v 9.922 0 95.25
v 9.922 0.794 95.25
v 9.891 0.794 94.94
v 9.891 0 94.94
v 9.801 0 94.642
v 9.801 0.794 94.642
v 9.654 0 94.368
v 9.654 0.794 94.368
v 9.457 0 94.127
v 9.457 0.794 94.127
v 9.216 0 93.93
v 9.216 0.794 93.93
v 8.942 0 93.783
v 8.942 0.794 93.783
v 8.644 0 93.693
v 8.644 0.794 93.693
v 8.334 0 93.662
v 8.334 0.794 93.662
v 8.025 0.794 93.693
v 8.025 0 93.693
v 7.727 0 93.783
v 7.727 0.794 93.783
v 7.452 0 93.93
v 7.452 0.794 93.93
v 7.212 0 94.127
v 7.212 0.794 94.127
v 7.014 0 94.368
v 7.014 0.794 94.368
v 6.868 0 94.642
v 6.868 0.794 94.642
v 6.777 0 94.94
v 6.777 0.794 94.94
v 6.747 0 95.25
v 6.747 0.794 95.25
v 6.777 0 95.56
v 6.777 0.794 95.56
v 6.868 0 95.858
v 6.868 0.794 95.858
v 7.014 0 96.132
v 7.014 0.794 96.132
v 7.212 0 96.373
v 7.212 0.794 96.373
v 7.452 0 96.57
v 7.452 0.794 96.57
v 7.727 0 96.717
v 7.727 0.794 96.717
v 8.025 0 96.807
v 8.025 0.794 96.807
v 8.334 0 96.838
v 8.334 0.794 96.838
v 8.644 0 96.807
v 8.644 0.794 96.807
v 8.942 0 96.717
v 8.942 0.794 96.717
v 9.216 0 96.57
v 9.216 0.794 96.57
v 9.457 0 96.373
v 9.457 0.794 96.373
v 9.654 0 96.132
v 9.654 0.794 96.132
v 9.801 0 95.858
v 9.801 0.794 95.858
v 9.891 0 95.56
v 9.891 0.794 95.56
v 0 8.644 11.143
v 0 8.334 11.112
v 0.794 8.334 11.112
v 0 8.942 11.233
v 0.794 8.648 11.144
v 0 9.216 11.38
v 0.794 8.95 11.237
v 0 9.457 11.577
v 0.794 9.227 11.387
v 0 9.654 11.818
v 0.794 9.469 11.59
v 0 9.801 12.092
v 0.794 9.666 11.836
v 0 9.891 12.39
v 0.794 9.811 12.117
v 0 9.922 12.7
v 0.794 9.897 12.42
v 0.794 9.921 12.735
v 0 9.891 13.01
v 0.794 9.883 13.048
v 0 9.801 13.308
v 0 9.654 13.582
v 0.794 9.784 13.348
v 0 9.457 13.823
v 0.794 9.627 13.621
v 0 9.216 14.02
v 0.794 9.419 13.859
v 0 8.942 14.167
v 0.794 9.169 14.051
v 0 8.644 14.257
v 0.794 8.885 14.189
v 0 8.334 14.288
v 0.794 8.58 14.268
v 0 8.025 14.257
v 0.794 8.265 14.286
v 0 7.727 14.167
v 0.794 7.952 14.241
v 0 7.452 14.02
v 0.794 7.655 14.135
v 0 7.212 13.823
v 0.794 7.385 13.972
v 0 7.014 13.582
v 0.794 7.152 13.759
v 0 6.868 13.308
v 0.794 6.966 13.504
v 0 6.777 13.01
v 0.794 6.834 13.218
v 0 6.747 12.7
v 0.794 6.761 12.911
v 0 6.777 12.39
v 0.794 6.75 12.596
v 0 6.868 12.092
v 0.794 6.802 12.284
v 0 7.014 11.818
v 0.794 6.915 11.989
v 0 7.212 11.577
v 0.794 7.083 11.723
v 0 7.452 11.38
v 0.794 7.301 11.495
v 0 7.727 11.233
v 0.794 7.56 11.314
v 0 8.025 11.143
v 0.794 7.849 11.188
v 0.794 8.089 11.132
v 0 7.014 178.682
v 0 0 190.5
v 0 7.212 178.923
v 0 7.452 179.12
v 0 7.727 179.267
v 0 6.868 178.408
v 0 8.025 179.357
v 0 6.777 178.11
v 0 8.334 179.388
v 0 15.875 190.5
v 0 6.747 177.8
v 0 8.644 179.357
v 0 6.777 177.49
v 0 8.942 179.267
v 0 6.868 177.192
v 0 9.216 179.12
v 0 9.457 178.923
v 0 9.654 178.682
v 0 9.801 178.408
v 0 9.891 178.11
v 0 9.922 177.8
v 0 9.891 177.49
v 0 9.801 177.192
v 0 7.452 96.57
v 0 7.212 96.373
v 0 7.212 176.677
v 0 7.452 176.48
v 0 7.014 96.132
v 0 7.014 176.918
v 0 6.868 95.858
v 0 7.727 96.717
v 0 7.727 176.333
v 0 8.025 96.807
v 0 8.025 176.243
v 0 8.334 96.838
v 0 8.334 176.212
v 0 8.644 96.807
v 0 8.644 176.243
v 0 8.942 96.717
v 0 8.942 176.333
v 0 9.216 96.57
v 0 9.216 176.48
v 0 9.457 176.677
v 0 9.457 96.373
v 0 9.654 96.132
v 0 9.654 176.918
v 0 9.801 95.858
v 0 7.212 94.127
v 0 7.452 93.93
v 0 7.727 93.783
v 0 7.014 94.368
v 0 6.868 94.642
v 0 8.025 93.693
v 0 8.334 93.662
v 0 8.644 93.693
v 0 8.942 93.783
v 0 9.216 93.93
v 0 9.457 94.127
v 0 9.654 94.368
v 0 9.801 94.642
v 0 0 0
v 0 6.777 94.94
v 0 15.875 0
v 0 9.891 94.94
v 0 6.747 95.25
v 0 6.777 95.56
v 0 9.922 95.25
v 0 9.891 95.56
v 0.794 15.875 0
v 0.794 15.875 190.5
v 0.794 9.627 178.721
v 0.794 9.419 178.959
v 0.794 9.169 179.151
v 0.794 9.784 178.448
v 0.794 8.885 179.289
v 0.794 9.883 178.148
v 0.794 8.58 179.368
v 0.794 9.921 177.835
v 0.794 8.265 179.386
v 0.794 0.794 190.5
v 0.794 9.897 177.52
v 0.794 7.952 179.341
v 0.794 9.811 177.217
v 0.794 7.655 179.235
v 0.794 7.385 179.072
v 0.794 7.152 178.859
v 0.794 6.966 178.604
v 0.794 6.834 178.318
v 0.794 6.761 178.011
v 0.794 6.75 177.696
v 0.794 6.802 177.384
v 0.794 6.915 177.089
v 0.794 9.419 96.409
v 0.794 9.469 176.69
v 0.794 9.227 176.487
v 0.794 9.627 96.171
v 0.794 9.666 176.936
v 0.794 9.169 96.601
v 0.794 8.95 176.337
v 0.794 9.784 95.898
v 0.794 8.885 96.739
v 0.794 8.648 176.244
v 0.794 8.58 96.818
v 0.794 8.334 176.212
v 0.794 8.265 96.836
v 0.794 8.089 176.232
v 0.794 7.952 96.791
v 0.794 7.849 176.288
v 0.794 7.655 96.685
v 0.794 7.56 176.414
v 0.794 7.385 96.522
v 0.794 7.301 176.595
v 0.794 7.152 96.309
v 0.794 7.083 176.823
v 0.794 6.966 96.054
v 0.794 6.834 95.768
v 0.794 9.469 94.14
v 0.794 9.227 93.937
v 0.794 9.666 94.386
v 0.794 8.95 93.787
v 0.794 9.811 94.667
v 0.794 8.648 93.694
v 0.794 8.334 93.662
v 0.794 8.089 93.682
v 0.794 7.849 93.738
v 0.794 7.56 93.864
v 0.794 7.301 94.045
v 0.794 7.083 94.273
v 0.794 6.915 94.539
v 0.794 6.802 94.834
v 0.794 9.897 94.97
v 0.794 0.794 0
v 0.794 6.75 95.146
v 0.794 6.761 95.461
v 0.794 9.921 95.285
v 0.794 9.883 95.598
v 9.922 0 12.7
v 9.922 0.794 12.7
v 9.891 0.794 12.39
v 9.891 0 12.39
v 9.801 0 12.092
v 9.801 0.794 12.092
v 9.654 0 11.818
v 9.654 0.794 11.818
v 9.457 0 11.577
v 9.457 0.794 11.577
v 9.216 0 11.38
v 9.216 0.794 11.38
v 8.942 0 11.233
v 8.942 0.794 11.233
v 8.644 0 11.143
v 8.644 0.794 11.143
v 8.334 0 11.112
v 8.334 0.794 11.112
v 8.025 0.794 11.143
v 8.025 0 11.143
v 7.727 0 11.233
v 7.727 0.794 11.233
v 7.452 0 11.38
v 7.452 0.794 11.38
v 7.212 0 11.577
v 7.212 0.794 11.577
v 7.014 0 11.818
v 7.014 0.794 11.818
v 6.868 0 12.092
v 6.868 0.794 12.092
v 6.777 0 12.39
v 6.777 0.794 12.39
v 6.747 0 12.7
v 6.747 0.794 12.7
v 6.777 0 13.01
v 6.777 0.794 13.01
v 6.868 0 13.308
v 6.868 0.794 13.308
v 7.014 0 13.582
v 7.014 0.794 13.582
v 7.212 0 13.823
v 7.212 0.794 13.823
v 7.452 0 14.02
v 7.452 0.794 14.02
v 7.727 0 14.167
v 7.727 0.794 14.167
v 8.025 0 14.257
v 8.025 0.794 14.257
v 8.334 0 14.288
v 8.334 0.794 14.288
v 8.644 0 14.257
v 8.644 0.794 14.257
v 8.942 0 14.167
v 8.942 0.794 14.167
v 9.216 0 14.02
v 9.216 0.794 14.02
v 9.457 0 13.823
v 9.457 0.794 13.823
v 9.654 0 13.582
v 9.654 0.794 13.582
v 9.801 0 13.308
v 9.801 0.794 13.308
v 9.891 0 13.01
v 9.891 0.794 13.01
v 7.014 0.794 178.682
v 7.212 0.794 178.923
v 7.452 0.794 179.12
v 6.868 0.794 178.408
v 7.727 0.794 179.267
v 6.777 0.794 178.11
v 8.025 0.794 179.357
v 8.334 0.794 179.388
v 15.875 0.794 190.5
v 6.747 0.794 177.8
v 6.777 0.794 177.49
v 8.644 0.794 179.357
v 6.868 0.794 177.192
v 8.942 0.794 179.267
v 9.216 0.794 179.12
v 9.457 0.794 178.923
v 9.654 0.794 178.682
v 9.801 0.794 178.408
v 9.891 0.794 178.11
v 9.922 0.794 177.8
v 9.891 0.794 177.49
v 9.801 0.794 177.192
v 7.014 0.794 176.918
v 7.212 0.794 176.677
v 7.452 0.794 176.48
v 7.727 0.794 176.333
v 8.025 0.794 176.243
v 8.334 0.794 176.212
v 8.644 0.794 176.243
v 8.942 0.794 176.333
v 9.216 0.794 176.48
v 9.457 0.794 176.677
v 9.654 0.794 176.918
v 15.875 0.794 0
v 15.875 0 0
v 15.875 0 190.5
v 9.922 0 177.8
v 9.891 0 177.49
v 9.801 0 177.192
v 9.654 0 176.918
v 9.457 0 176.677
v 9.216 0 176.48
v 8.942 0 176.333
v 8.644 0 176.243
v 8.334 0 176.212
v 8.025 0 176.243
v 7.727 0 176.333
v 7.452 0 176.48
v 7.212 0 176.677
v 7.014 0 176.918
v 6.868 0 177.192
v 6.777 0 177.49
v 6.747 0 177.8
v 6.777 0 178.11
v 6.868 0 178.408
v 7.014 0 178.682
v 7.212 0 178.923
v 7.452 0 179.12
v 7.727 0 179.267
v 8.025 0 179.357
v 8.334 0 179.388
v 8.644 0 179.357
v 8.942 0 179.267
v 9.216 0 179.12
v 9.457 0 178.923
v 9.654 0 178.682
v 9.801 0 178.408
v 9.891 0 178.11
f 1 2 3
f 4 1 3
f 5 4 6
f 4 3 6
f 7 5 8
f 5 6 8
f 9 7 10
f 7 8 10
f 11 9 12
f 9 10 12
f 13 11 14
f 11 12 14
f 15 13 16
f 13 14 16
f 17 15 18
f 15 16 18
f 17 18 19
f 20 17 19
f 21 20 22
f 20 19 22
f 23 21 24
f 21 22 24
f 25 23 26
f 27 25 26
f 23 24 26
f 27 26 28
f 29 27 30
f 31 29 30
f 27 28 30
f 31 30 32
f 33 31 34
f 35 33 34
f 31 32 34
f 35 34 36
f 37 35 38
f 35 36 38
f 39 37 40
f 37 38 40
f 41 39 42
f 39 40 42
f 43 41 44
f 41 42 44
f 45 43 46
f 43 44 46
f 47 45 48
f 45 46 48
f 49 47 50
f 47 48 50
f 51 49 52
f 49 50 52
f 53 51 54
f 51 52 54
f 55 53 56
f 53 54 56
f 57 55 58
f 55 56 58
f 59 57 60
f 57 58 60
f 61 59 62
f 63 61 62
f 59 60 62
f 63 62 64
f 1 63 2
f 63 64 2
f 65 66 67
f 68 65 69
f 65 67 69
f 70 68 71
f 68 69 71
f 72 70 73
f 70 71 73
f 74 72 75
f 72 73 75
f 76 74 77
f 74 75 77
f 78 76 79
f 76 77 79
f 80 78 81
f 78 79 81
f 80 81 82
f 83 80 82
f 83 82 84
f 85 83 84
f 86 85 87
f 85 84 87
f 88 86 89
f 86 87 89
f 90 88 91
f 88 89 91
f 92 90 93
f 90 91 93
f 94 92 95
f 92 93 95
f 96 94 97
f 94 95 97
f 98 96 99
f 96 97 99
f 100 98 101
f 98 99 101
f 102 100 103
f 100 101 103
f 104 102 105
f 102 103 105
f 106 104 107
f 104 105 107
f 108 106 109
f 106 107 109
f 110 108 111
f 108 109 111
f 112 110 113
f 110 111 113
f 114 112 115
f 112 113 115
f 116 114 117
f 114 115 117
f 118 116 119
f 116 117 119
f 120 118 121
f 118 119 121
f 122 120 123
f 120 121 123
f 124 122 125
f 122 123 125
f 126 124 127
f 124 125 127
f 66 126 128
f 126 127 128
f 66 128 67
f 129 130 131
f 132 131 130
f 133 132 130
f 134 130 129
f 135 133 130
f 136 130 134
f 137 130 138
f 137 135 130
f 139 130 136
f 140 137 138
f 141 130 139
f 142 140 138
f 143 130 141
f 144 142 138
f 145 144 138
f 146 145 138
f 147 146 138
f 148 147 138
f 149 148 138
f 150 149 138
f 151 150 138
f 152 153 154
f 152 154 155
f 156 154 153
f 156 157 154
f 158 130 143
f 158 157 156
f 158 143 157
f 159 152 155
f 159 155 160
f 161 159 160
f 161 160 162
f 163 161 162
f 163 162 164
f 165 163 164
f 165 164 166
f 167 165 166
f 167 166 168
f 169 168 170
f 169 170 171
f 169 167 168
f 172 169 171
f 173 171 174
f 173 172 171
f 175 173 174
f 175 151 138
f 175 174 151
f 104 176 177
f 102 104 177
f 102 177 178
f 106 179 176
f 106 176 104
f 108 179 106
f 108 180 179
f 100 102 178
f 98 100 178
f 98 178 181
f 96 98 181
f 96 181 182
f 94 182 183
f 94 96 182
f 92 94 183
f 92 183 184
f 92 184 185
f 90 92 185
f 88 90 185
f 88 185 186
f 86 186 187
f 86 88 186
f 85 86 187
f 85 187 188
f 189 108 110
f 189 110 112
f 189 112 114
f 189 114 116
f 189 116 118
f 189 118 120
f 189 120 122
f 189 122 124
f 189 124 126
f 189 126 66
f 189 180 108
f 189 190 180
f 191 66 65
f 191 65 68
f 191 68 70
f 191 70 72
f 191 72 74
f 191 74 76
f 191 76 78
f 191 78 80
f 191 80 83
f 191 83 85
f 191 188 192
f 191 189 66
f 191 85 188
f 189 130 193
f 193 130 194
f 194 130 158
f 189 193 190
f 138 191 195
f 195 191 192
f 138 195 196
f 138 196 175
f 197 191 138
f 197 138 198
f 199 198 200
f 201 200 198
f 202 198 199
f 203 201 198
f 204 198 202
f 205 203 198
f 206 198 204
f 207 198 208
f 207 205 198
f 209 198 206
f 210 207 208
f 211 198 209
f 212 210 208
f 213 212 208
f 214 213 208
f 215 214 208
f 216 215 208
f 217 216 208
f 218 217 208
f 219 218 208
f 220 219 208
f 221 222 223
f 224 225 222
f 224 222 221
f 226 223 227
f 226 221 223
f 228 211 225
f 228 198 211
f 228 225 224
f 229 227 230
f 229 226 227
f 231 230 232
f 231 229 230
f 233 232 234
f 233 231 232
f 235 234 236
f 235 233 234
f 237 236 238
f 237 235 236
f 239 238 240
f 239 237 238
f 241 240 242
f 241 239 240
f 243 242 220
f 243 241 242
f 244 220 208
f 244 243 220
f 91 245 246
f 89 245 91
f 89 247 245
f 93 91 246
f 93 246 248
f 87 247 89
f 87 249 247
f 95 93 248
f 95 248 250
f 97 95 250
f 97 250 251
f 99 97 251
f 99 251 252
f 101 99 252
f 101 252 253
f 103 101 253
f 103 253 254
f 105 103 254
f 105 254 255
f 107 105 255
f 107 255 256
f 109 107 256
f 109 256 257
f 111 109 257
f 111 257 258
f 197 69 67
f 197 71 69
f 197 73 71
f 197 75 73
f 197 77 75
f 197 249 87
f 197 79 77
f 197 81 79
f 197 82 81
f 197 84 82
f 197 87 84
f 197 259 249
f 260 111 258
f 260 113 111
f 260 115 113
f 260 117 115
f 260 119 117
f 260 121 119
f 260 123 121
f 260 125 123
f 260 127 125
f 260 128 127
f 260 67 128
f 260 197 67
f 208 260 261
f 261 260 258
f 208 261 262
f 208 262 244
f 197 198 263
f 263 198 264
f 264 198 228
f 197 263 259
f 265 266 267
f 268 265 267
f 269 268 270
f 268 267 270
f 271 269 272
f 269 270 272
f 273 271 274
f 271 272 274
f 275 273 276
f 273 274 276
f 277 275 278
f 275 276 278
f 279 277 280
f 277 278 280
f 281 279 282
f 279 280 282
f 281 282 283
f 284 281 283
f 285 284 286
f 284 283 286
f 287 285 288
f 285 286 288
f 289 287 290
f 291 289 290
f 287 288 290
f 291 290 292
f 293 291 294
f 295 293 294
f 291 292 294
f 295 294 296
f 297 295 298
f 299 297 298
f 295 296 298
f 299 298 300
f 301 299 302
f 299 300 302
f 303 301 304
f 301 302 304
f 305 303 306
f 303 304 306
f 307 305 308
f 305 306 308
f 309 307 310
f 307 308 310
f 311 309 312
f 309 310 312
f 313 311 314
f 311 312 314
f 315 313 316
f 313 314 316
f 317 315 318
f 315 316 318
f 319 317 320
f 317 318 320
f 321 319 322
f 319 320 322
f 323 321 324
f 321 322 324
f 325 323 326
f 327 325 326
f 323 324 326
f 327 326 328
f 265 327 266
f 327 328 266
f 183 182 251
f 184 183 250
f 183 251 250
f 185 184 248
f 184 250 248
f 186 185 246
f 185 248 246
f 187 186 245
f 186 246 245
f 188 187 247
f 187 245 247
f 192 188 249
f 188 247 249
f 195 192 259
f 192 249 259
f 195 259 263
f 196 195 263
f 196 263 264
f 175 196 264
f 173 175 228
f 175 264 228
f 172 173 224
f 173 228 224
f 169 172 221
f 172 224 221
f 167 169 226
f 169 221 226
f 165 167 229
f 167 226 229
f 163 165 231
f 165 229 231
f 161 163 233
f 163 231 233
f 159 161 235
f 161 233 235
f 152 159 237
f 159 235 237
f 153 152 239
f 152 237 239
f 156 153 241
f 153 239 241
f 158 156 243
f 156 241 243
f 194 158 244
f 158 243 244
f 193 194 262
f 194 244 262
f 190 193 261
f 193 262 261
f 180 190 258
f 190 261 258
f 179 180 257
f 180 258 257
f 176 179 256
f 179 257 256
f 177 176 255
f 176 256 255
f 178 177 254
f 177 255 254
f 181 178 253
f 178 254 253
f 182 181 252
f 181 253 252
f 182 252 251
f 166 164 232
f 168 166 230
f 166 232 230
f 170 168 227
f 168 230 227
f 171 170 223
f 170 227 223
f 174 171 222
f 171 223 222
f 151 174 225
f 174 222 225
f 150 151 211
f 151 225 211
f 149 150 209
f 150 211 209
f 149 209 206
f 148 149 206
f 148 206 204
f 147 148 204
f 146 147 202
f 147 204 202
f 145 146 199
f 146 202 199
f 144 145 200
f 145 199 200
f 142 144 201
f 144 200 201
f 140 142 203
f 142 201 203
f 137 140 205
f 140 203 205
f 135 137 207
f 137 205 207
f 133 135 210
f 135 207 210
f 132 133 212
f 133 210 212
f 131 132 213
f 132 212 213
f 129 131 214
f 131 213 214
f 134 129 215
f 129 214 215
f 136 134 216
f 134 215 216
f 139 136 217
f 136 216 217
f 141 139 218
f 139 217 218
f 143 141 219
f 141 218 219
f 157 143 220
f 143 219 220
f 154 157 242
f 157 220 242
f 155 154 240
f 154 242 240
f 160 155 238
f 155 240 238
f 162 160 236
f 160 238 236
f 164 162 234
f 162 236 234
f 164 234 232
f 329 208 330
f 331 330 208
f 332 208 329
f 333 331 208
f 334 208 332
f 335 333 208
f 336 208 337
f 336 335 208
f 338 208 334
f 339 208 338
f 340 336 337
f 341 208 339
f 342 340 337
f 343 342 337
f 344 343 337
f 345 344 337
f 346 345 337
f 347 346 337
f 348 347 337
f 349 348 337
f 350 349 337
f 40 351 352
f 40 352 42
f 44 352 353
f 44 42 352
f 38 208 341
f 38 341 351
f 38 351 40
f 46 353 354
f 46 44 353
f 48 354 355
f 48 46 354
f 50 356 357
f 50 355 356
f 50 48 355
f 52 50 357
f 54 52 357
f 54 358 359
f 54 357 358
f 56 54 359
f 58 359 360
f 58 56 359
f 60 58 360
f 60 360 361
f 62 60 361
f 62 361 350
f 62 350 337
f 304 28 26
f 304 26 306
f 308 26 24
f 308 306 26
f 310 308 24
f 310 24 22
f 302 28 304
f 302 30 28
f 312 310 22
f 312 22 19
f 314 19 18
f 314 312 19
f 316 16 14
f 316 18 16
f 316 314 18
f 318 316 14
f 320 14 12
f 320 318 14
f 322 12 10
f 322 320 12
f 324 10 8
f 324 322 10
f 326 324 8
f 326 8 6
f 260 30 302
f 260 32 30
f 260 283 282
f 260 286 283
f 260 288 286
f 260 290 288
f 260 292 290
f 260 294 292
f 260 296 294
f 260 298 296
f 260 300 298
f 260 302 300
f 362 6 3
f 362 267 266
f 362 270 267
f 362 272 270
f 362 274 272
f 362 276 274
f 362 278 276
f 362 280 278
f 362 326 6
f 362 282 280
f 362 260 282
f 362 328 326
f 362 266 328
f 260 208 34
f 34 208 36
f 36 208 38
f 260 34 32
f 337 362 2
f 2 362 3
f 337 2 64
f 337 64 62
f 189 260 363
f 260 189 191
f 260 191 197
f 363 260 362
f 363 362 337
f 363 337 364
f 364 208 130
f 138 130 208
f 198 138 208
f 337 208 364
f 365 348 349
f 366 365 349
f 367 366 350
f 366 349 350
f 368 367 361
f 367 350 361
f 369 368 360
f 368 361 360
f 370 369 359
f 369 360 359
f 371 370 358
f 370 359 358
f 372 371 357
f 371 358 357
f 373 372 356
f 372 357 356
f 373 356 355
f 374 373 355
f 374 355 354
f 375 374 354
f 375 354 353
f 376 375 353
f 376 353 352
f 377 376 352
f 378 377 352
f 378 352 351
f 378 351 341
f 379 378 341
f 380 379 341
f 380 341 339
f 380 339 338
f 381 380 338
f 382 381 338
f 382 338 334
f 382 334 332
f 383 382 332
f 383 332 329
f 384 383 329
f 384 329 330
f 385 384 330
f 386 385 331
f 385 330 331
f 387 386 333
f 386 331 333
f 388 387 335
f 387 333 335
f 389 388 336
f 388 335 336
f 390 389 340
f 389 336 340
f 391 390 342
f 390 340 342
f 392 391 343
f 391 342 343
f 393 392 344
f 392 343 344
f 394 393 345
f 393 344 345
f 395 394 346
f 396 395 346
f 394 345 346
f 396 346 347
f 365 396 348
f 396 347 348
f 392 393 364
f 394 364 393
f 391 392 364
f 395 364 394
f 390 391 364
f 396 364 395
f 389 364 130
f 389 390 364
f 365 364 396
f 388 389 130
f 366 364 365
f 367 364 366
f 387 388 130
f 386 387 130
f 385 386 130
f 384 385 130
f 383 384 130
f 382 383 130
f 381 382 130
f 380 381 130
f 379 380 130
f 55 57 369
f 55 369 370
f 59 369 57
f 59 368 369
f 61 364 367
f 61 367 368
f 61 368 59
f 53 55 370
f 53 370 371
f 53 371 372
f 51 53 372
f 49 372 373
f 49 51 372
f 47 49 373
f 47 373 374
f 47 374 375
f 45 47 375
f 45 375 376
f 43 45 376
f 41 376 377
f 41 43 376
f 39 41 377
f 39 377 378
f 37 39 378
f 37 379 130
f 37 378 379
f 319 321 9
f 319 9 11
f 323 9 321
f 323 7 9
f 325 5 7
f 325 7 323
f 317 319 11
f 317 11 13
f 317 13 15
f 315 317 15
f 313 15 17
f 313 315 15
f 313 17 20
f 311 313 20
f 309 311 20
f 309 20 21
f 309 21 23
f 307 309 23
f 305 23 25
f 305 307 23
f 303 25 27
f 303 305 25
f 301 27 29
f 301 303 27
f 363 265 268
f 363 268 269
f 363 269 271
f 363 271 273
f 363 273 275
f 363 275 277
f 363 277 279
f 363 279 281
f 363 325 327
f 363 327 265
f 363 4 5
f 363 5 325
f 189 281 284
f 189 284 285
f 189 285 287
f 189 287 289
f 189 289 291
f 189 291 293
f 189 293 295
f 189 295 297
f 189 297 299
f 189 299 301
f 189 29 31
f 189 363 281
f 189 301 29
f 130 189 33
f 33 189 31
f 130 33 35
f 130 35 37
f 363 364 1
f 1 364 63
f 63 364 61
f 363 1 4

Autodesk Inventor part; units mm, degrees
ref_plane "YZ Plane" through (0, 0, 0) normal (1, 0, 0) x (0, 1, 0)
ref_plane "XZ Plane" through (0, 0, 0) normal (0, 1, 0) x (-1, 0, 0)
ref_plane "XY Plane" through (0, 0, 0) normal (0, 0, 1) x (1, 0, 0)
sketch "Sketch1" plane through (0, 0, 0) normal (0, 0, 1) x (1, 0, 0)
  line L0 (0, 0) -> (0, 15.875)
  line L1 (0, 15.875) -> (0.7937, 15.875)
  line L2 (0.7937, 15.875) -> (0.7938, 0.7937)
  line L3 (0.7938, 0.7937) -> (15.875, 0.7937)
  line L4 (15.875, 0.7937) -> (15.875, 0)
  line L5 (15.875, 0) -> (0, 0)
  dimension "d0" = 15.875
  dimension "d1" = 0.7937
extrude "Extrusion1" add sketch "Sketch1" along normal blind 190.5
sketch "Sketch2" plane through (0.7938, 0.7937, 0) normal (0, 1, 0) x (1, 0, 0)
  line L0 (0, 0) -> (15.0812, 0) projected
  line L1 (15.0812, -190.5) -> (0, -190.5) projected
  line L2 (7.5406, 0) -> (7.5406, -190.5) construction
  circle A0 centre (7.5406, -12.7) radius 1.5875
  circle A1 centre (7.5406, -95.25) radius 1.5875
  circle A2 centre (7.5406, -177.8) radius 1.5875
  point P0 (-0.7938, 0)
  dimension "d4" = 12.7
  dimension "d5" = 3.175
  dimension "d6" = 190.5
  dimension "d9" = 82.55
sketch "Sketch3" plane through (0.7938, 0.7937, 0) normal (1, 0, 0) x (0, 0, -1)
  line L0 (0, 15.0812) -> (0, 0) projected
  line L1 (-190.5, 0) -> (-190.5, 15.0812) projected
  line L2 (-190.5, 7.5406) -> (0, 7.5406) construction
  circle A0 centre (-12.7, 7.5406) radius 1.5875
  circle A1 centre (-95.25, 7.5406) radius 1.5875
  circle A2 centre (-177.8, 7.5406) radius 1.5875
  point P0 (0, -0.7937)
  dimension "d14" = 3.175
  dimension "d15" = 12.7
  dimension "d16" = 190.5
  dimension "d19" = 82.55
extrude "Extrusion2" cut sketch "Sketch2" against normal through all
extrude "Extrusion3" cut sketch "Sketch3" against normal through all
properties part number "Hopper Bracing Front Left P5" material "Aluminum 6061"
